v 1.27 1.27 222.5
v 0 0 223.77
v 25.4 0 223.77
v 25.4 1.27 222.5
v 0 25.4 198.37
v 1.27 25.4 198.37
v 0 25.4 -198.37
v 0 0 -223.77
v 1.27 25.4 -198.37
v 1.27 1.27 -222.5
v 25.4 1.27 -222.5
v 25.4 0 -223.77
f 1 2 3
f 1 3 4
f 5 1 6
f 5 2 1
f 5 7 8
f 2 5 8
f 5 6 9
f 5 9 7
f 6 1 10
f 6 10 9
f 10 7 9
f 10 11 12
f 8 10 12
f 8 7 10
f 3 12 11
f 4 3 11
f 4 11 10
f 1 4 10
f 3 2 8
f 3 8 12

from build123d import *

# Parameters (mm, degrees)
BOSS_EXTRUDE1_DEPTH      = 304.8
BOSS_EXTRUDE1_DEPTH_BACK = 304.8
CUT_EXTRUDE1_DEPTH       = 307.909367729


with BuildPart() as part:
    # Sketch1 → Boss-Extrude1 (new, two sides: drawn at the far end of the back side and taken through both)
    with BuildSketch(Plane.XY.offset(-BOSS_EXTRUDE1_DEPTH_BACK)):
        Polygon((0, 25.4), (0, 0), (25.4, 0), (25.4, 1.27), (1.27, 1.27), (1.27, 25.4), align=None)
    extrude(amount=BOSS_EXTRUDE1_DEPTH + BOSS_EXTRUDE1_DEPTH_BACK)

    # Sketch2 → Cut-Extrude1 (cut, through all)
    with BuildSketch(Plane.ZY):
        Polygon((223.77, 0), (198.37, 25.4), (304.8, 25.4), (304.8, 0), align=None)
        Polygon((-304.8, 0), (-304.8, 25.4), (-198.37, 25.4), (-223.77, 0), align=None)
    extrude(amount=-CUT_EXTRUDE1_DEPTH, mode=Mode.SUBTRACT)


solid = part.part
